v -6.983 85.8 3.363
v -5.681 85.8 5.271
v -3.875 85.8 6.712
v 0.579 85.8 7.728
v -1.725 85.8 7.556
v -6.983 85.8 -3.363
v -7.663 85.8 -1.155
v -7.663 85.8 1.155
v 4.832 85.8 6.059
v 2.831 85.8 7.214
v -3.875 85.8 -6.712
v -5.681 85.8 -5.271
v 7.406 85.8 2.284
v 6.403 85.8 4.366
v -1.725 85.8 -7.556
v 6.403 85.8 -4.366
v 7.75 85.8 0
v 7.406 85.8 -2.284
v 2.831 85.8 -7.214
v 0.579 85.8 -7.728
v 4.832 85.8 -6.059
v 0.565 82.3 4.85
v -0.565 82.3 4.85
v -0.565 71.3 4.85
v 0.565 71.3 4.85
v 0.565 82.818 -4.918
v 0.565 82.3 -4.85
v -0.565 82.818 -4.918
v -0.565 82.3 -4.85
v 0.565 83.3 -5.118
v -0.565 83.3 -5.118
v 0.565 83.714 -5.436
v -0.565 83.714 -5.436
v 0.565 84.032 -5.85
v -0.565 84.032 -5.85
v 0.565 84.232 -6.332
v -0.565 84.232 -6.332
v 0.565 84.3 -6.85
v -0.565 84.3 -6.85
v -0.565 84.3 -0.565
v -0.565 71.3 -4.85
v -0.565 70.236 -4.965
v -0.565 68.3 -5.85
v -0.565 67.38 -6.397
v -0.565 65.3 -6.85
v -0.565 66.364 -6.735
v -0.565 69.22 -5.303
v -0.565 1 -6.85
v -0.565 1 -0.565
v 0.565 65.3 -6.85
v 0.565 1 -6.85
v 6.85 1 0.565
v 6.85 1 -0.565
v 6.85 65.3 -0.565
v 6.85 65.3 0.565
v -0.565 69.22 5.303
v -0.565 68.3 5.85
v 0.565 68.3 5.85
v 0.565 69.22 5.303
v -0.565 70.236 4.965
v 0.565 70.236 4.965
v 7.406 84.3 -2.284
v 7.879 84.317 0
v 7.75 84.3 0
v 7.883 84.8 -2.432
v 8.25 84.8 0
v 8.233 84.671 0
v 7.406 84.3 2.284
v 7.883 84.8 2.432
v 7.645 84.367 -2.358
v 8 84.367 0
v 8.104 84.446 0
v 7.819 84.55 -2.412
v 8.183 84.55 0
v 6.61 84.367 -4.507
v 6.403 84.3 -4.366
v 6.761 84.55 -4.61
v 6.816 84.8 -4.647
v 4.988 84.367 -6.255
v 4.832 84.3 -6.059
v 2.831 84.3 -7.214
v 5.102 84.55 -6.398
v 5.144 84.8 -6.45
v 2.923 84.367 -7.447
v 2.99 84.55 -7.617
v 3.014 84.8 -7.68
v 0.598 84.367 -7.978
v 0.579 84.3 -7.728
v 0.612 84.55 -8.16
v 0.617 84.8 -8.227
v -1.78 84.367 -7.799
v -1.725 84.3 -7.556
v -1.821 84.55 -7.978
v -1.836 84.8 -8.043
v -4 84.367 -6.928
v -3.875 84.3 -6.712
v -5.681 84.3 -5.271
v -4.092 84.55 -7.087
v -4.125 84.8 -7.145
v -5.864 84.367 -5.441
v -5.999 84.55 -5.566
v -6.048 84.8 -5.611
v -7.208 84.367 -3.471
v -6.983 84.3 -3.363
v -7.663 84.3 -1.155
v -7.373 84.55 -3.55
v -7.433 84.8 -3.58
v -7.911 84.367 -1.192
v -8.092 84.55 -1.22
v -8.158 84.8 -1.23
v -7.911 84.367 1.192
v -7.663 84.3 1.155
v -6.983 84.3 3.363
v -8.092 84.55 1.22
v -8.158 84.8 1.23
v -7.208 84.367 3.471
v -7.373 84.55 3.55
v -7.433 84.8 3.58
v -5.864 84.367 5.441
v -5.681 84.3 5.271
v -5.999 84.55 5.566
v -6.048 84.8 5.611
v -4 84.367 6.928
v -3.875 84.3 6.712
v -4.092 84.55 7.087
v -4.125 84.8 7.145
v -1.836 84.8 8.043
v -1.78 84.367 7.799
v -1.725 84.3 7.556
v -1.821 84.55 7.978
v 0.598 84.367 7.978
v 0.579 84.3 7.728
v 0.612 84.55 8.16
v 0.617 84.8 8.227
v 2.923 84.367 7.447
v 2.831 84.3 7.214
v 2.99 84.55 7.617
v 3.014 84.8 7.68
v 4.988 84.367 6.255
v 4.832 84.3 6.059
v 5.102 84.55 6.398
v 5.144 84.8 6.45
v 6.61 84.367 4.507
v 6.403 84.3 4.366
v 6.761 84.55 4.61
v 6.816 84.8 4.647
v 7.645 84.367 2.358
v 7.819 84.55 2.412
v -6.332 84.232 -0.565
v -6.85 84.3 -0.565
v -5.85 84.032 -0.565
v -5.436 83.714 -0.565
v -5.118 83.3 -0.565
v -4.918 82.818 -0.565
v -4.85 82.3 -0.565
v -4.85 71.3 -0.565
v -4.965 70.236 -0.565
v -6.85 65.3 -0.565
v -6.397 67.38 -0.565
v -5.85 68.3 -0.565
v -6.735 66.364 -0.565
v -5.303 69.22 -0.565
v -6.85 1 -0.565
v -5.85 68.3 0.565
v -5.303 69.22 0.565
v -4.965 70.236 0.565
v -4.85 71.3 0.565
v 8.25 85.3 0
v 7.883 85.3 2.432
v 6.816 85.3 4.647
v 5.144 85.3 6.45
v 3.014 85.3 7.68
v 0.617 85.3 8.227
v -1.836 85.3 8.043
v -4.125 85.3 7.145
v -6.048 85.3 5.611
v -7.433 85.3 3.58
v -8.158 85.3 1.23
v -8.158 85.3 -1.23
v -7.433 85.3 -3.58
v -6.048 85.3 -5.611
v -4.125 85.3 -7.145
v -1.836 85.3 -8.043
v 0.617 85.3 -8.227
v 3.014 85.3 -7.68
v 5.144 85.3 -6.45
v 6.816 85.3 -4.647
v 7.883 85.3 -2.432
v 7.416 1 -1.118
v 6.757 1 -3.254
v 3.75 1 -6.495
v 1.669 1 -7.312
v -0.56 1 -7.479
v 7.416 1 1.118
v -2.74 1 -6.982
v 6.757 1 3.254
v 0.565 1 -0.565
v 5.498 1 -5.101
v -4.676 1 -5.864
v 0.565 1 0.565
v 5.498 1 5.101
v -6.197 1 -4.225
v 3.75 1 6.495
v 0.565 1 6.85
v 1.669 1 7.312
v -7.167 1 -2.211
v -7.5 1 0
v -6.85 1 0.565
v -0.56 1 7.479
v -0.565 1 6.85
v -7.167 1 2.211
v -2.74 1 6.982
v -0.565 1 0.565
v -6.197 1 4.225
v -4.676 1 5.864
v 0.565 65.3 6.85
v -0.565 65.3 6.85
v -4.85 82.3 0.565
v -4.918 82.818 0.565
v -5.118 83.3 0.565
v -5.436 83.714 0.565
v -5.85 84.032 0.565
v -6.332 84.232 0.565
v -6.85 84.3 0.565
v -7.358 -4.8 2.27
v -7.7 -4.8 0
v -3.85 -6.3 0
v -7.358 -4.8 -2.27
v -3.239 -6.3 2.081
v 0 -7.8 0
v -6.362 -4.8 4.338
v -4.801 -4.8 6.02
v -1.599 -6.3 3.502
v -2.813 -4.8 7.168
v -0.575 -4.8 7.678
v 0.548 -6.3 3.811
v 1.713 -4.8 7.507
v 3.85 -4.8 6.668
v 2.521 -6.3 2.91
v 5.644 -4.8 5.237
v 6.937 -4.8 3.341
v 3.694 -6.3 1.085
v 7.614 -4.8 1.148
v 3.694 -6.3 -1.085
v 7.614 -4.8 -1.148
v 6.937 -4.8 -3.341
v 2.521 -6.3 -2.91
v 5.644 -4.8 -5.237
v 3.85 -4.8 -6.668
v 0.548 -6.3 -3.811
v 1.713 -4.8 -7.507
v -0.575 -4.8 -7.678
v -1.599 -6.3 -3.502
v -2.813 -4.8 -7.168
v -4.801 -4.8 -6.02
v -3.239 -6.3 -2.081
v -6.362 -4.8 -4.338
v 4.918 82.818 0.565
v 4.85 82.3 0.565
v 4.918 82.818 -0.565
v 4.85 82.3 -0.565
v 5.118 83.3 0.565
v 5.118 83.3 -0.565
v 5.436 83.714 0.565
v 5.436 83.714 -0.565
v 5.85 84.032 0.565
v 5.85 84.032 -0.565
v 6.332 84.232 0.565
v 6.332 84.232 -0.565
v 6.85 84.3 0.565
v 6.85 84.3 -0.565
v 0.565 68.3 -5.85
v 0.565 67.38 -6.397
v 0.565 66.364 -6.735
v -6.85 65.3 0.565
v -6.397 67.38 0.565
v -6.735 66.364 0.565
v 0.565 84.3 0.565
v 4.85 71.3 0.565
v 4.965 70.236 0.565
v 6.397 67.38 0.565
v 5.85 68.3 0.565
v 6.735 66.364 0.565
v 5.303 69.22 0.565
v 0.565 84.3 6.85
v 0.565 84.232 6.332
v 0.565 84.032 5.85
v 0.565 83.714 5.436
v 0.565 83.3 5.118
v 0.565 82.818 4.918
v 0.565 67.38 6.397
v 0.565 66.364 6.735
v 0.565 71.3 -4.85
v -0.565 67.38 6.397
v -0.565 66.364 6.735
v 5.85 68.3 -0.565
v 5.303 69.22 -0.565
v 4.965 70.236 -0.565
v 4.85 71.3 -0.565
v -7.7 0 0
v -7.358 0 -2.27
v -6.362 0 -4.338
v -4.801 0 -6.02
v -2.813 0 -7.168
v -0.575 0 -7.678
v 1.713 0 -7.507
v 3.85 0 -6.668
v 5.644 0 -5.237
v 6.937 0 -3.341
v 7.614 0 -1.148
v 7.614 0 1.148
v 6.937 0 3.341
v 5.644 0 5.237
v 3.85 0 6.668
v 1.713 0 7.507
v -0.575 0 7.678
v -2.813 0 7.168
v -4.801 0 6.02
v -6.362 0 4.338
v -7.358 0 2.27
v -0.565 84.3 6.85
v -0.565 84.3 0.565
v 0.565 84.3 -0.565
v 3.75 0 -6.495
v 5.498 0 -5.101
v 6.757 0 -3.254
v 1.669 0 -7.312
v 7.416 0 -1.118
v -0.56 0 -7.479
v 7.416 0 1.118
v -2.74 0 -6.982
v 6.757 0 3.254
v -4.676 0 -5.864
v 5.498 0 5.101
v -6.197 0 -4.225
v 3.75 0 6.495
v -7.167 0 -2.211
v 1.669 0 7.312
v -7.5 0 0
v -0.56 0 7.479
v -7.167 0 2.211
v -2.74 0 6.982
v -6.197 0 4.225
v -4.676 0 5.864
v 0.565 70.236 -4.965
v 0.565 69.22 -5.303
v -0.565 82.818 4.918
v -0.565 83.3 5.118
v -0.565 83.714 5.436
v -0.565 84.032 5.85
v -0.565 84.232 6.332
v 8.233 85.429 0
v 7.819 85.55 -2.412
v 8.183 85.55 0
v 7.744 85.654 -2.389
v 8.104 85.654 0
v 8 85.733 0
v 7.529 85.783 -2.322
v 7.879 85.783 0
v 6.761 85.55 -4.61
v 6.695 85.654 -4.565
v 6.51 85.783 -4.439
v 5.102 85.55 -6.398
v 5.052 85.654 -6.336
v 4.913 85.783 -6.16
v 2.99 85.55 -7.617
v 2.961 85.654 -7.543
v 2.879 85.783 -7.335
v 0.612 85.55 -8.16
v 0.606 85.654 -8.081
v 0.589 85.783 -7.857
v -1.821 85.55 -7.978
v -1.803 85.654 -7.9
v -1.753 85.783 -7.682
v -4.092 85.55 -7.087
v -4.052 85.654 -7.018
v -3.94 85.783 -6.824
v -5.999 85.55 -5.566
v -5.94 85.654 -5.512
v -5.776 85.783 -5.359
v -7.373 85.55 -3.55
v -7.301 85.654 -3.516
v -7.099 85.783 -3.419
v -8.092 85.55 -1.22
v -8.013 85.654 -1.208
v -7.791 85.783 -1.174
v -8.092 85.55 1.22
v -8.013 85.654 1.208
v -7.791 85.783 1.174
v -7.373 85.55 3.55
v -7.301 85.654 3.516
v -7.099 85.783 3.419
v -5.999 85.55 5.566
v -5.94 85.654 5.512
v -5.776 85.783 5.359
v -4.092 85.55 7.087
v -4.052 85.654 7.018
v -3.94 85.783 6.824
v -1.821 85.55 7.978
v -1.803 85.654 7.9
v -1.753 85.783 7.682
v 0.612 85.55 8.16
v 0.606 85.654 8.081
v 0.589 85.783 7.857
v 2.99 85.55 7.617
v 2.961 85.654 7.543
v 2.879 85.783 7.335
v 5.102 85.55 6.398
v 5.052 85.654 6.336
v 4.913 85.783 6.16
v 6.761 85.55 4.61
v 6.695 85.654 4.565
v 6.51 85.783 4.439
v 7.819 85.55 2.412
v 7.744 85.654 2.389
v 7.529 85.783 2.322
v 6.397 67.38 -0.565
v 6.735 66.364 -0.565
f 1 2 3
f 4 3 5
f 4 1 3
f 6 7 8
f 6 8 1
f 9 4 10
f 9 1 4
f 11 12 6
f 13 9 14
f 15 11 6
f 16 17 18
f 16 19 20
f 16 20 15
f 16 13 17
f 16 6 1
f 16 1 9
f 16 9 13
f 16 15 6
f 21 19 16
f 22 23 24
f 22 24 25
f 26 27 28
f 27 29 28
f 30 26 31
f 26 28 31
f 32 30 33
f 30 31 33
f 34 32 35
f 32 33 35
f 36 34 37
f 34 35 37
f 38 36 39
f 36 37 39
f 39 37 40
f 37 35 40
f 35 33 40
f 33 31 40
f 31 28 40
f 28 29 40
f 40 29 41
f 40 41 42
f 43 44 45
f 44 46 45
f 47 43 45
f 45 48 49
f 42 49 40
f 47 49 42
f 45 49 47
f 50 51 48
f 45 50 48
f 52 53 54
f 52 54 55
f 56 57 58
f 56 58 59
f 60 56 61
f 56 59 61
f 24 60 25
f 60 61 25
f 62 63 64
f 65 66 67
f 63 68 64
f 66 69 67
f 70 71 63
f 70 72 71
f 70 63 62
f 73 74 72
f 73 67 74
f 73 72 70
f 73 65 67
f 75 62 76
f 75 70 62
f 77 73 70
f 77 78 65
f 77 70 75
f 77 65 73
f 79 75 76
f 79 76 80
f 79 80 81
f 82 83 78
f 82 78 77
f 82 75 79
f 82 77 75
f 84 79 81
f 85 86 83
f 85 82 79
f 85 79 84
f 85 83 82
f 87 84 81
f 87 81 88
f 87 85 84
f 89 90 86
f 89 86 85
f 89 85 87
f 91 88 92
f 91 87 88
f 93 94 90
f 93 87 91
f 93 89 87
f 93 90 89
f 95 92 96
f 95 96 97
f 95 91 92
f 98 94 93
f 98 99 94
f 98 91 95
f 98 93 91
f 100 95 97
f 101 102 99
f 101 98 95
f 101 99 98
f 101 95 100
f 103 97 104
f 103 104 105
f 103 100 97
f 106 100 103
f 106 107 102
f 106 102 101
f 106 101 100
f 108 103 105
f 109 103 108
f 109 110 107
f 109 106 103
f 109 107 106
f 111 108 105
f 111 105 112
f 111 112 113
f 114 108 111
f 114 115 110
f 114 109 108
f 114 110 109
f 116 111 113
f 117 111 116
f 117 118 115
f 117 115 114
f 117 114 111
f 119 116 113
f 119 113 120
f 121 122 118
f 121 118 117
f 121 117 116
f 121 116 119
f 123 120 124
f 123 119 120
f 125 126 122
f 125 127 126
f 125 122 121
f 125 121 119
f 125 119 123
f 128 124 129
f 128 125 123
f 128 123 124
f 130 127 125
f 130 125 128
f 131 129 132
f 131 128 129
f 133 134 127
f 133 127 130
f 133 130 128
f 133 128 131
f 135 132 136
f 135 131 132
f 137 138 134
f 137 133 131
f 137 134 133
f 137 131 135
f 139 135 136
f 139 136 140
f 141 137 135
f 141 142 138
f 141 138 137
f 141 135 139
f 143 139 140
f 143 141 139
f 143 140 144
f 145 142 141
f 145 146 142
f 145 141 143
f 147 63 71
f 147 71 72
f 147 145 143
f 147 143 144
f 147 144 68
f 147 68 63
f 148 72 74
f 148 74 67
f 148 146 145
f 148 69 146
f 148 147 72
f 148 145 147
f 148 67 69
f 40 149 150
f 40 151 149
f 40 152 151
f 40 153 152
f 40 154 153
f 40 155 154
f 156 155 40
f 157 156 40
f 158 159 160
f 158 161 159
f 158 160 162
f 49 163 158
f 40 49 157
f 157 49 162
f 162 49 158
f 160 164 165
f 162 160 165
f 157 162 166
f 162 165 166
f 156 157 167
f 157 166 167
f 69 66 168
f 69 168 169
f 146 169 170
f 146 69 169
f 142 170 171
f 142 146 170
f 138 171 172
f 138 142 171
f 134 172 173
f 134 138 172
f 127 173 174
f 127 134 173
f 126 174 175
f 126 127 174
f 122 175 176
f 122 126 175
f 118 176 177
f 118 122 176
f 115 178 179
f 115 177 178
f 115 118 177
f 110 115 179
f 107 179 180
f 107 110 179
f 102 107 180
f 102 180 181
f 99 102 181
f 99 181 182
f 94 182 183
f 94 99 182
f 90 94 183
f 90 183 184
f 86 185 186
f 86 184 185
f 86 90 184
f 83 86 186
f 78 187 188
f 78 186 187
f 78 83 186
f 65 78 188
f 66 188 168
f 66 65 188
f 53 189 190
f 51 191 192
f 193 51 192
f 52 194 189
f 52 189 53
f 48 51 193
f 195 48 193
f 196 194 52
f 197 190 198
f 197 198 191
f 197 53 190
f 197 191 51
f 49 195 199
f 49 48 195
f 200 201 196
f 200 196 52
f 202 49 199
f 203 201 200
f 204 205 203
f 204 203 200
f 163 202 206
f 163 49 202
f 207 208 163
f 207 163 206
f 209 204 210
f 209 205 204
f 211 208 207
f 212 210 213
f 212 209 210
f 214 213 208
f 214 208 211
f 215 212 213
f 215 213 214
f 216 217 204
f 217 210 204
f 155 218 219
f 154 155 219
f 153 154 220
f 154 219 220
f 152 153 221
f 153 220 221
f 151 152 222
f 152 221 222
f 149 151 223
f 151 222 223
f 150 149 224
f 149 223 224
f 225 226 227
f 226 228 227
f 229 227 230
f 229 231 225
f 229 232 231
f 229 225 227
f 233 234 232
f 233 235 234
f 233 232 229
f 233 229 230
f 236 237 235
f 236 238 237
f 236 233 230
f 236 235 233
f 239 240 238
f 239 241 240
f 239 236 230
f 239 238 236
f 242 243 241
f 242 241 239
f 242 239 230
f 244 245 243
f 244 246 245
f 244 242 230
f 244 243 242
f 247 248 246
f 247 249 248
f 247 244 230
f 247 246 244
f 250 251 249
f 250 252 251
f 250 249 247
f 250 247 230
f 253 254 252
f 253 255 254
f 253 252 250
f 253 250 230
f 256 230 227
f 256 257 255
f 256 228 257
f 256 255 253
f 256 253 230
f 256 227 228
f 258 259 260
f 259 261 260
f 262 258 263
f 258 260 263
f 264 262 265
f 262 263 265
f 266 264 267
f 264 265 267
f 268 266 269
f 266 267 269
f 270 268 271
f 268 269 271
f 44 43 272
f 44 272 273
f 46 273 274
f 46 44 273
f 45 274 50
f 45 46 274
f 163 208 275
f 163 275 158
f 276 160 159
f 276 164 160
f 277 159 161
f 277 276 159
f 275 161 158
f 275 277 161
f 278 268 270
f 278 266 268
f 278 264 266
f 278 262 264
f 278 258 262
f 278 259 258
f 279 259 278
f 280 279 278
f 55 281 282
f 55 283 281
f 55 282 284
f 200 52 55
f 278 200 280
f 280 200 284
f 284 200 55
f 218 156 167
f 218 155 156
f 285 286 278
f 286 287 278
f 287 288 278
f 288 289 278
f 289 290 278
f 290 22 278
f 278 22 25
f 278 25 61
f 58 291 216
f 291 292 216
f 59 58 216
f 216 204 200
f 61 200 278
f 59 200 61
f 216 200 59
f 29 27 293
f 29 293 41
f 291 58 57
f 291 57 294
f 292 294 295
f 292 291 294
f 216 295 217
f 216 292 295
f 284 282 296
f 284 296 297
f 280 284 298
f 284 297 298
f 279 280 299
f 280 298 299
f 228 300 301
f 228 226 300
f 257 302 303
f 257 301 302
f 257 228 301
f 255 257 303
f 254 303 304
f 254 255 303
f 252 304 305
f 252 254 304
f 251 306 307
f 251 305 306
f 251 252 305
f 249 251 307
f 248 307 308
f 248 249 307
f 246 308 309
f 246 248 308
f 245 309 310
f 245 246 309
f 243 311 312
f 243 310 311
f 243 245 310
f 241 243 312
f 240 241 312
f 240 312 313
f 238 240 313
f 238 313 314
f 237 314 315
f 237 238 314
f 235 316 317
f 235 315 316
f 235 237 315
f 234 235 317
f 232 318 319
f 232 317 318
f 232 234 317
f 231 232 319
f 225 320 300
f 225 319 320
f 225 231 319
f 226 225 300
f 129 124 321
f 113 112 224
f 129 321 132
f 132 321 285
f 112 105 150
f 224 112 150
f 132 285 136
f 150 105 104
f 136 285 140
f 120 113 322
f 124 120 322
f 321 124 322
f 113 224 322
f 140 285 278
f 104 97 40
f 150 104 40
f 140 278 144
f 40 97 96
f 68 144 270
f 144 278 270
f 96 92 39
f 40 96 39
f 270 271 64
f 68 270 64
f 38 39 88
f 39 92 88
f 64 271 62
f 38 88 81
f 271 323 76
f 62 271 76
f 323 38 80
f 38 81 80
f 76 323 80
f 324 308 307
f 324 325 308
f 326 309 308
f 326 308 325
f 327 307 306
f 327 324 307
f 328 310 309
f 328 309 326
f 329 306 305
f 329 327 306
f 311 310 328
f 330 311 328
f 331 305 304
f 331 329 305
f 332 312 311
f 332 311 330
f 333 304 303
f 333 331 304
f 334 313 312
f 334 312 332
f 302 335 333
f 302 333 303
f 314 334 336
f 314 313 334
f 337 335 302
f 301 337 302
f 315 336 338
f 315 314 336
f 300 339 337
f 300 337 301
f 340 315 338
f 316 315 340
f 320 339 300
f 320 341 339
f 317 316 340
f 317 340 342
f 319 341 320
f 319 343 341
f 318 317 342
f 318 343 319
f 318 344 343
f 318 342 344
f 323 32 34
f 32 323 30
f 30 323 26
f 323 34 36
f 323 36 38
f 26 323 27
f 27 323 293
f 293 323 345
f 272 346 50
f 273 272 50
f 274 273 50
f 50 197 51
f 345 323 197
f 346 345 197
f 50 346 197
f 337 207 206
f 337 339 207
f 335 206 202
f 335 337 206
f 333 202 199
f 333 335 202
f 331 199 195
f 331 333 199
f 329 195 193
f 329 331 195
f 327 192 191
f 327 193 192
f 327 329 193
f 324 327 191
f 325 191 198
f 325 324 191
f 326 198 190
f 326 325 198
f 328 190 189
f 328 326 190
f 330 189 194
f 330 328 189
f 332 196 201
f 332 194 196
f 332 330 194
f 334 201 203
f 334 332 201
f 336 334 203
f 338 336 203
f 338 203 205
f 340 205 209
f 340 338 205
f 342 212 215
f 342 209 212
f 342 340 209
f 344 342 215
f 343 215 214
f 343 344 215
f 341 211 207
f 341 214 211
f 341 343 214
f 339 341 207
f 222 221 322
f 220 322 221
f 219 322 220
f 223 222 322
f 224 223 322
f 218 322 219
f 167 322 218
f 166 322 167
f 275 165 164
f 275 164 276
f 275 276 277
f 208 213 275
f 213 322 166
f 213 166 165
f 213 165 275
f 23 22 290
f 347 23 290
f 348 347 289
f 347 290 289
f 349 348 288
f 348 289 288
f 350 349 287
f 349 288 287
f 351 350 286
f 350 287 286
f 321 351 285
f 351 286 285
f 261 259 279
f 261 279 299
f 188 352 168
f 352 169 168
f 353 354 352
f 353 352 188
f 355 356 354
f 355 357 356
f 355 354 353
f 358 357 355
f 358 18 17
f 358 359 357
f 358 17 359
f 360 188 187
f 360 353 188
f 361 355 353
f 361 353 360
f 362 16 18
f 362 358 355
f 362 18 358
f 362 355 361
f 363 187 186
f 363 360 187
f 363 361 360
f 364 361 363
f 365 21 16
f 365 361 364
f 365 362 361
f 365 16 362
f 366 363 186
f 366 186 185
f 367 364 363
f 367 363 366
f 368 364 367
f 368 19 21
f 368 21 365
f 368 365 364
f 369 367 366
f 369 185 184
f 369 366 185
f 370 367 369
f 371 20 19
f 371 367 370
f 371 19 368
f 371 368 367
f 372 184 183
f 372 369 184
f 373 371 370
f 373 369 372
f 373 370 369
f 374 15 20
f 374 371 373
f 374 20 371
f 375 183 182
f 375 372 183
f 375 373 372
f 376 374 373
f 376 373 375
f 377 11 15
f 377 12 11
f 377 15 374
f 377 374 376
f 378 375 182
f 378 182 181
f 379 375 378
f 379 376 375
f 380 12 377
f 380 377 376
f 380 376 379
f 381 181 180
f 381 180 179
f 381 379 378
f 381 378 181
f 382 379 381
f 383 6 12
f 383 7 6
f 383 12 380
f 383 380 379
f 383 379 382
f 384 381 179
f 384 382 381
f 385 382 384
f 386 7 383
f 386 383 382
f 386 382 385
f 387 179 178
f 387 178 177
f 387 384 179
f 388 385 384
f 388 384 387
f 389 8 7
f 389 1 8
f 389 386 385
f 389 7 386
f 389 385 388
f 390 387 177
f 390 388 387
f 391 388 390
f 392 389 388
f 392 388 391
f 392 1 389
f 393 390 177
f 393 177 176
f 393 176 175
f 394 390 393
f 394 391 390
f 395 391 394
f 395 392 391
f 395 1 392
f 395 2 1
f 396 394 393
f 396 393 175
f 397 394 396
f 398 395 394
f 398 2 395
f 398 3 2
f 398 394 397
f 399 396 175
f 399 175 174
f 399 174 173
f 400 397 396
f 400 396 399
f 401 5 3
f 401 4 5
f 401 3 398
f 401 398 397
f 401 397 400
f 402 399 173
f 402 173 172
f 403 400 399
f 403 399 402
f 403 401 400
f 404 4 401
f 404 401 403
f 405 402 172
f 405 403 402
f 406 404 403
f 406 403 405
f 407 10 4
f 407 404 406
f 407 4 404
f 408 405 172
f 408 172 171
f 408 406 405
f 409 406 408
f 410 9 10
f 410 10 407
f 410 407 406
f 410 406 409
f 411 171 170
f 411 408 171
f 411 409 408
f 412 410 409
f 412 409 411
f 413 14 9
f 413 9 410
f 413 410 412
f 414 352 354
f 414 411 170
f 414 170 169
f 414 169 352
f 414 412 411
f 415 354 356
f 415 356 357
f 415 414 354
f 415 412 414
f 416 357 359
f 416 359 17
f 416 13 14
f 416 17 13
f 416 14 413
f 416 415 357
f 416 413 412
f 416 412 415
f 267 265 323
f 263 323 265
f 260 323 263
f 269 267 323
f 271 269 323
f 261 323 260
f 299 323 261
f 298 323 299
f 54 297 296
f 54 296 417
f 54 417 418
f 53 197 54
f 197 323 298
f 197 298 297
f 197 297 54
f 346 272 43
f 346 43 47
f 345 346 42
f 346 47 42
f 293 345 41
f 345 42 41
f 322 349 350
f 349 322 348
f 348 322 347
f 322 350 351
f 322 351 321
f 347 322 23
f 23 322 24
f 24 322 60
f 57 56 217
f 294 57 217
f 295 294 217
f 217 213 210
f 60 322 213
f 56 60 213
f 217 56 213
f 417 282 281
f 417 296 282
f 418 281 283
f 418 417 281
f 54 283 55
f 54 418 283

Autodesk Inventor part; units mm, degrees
ref_plane "YZ Plane" through (0, 0, 0) normal (1, 0, 0) x (0, 1, 0)
ref_plane "XZ Plane" through (0, 0, 0) normal (0, 1, 0) x (-1, 0, 0)
ref_plane "XY Plane" through (0, 0, 0) normal (0, 0, 1) x (1, 0, 0)
sketch "Sketch1" plane through (0, 0, 0) normal (0, 1, 0) x (-1, 0, 0)
  circle A0 centre (0, 0) radius 7.5
  dimension "d0" = 15
extrude "Extrusion1" add sketch "Sketch1" along normal blind 1
sketch "Sketch2" plane through (0, 1, 0) normal (0, 1, 0) x (1, 0, 0)
  line L0 (-0.565, -6.85) -> (0.565, -6.85)
  line L1 (0.565, -6.85) -> (0.565, 6.85)
  line L2 (0.565, 6.85) -> (-0.565, 6.85)
  line L3 (-0.565, 6.85) -> (-0.565, -6.85)
  line L4 (-0.565, -6.85) -> (0.565, 6.85) construction
  line L5 (0.565, -6.85) -> (-0.565, 6.85) construction
  line L6 (6.85, -0.565) -> (-6.85, -0.565)
  line L7 (-6.85, -0.565) -> (-6.85, 0.565)
  line L8 (-6.85, 0.565) -> (6.85, 0.565)
  line L9 (6.85, 0.565) -> (6.85, -0.565)
  line L10 (6.85, -0.565) -> (-6.85, 0.565) construction
  line L11 (-6.85, -0.565) -> (6.85, 0.565) construction
  point P0 (0, 0)
  point P1 (0.565, 0.565)
  point P2 (-0.565, 0.565)
  point P3 (-0.565, -0.565)
  point P4 (0.565, -0.565)
  dimension "d3" = 13.7
  dimension "d4" = 13.7
  dimension "d5" = 1.13
  dimension "d6" = 1.13
extrude "Extrusion2" add sketch "Sketch2" along normal blind 83.3
sketch "Sketch3" plane through (0, 84.3, 0) normal (0, 1, 0) x (1, 0, 0)
  circle A0 centre (0, 0) radius 8.25
  dimension "d9" = 16.5
extrude "Extrusion3" add sketch "Sketch3" along normal blind 1.5
sketch "Sketch4" plane through (6.85, 1, -0.565) normal (1, 0, 0) x (0, 0, -1)
  line L0 (-1.13, 0) -> (-1.13, 83.3) projected
  line L1 (0, 0) -> (0, 83.3) projected
  line L2 (-1.13, 83.3) -> (0, 83.3)
  line L3 (0, 83.3) -> (0, 66.3)
  line L4 (0, 66.3) -> (-1.13, 66.3)
  line L5 (-1.13, 66.3) -> (-1.13, 83.3)
  point P0 (-0.565, -1)
  dimension "d12" = 17
extrude "Extrusion4" cut sketch "Sketch4" against normal blind 2
pattern_circular "Circular Pattern1" count 4 over 360 about axis through (0, 84.3, 0) along (0, 1, 0) of "Extrusion4"
fillet "Fillet1" radius 5 8 edges at (4.85, 67.3, 0) (0, 67.3, -4.85) (-4.85, 67.3, 0) (0, 67.3, 4.85) (-6.85, 67.3, 0) (0, 67.3, 6.85) (0, 67.3, -6.85) (6.85, 67.3, 0)
fillet "Fillet2" radius 2 4 edges at (0, 84.3, -4.85) (-4.85, 84.3, 0) (0, 84.3, 4.85) (4.85, 84.3, 0)
fillet "Fillet3" radius 0.5 2 edges at (-8.25, 84.3, 0) (-8.25, 85.8, 0)
sketch "Sketch6" plane through (0, 0, 0) normal (0, 0, 1) x (1, 0, 0)
  line L0 (-7.7, 0) -> (-7.7, -4.8)
  line L1 (-7.7, -4.8) -> (0, -7.8)
  line L2 (0, -7.8) -> (0, 0)
  line L3 (0, 0) -> (-7.7, 0)
  line L4 (0, -26.52) -> (0, 104.52) projected
  dimension "d22" = 4.8
  dimension "d23" = 7.7
  dimension "d24" = 3
revolve "Revolution1" add sketch "Sketch6" angle 360 about axis through (0, 0, 0) along (0, 1, 0)
properties part number "10 mL syringe plunger"
